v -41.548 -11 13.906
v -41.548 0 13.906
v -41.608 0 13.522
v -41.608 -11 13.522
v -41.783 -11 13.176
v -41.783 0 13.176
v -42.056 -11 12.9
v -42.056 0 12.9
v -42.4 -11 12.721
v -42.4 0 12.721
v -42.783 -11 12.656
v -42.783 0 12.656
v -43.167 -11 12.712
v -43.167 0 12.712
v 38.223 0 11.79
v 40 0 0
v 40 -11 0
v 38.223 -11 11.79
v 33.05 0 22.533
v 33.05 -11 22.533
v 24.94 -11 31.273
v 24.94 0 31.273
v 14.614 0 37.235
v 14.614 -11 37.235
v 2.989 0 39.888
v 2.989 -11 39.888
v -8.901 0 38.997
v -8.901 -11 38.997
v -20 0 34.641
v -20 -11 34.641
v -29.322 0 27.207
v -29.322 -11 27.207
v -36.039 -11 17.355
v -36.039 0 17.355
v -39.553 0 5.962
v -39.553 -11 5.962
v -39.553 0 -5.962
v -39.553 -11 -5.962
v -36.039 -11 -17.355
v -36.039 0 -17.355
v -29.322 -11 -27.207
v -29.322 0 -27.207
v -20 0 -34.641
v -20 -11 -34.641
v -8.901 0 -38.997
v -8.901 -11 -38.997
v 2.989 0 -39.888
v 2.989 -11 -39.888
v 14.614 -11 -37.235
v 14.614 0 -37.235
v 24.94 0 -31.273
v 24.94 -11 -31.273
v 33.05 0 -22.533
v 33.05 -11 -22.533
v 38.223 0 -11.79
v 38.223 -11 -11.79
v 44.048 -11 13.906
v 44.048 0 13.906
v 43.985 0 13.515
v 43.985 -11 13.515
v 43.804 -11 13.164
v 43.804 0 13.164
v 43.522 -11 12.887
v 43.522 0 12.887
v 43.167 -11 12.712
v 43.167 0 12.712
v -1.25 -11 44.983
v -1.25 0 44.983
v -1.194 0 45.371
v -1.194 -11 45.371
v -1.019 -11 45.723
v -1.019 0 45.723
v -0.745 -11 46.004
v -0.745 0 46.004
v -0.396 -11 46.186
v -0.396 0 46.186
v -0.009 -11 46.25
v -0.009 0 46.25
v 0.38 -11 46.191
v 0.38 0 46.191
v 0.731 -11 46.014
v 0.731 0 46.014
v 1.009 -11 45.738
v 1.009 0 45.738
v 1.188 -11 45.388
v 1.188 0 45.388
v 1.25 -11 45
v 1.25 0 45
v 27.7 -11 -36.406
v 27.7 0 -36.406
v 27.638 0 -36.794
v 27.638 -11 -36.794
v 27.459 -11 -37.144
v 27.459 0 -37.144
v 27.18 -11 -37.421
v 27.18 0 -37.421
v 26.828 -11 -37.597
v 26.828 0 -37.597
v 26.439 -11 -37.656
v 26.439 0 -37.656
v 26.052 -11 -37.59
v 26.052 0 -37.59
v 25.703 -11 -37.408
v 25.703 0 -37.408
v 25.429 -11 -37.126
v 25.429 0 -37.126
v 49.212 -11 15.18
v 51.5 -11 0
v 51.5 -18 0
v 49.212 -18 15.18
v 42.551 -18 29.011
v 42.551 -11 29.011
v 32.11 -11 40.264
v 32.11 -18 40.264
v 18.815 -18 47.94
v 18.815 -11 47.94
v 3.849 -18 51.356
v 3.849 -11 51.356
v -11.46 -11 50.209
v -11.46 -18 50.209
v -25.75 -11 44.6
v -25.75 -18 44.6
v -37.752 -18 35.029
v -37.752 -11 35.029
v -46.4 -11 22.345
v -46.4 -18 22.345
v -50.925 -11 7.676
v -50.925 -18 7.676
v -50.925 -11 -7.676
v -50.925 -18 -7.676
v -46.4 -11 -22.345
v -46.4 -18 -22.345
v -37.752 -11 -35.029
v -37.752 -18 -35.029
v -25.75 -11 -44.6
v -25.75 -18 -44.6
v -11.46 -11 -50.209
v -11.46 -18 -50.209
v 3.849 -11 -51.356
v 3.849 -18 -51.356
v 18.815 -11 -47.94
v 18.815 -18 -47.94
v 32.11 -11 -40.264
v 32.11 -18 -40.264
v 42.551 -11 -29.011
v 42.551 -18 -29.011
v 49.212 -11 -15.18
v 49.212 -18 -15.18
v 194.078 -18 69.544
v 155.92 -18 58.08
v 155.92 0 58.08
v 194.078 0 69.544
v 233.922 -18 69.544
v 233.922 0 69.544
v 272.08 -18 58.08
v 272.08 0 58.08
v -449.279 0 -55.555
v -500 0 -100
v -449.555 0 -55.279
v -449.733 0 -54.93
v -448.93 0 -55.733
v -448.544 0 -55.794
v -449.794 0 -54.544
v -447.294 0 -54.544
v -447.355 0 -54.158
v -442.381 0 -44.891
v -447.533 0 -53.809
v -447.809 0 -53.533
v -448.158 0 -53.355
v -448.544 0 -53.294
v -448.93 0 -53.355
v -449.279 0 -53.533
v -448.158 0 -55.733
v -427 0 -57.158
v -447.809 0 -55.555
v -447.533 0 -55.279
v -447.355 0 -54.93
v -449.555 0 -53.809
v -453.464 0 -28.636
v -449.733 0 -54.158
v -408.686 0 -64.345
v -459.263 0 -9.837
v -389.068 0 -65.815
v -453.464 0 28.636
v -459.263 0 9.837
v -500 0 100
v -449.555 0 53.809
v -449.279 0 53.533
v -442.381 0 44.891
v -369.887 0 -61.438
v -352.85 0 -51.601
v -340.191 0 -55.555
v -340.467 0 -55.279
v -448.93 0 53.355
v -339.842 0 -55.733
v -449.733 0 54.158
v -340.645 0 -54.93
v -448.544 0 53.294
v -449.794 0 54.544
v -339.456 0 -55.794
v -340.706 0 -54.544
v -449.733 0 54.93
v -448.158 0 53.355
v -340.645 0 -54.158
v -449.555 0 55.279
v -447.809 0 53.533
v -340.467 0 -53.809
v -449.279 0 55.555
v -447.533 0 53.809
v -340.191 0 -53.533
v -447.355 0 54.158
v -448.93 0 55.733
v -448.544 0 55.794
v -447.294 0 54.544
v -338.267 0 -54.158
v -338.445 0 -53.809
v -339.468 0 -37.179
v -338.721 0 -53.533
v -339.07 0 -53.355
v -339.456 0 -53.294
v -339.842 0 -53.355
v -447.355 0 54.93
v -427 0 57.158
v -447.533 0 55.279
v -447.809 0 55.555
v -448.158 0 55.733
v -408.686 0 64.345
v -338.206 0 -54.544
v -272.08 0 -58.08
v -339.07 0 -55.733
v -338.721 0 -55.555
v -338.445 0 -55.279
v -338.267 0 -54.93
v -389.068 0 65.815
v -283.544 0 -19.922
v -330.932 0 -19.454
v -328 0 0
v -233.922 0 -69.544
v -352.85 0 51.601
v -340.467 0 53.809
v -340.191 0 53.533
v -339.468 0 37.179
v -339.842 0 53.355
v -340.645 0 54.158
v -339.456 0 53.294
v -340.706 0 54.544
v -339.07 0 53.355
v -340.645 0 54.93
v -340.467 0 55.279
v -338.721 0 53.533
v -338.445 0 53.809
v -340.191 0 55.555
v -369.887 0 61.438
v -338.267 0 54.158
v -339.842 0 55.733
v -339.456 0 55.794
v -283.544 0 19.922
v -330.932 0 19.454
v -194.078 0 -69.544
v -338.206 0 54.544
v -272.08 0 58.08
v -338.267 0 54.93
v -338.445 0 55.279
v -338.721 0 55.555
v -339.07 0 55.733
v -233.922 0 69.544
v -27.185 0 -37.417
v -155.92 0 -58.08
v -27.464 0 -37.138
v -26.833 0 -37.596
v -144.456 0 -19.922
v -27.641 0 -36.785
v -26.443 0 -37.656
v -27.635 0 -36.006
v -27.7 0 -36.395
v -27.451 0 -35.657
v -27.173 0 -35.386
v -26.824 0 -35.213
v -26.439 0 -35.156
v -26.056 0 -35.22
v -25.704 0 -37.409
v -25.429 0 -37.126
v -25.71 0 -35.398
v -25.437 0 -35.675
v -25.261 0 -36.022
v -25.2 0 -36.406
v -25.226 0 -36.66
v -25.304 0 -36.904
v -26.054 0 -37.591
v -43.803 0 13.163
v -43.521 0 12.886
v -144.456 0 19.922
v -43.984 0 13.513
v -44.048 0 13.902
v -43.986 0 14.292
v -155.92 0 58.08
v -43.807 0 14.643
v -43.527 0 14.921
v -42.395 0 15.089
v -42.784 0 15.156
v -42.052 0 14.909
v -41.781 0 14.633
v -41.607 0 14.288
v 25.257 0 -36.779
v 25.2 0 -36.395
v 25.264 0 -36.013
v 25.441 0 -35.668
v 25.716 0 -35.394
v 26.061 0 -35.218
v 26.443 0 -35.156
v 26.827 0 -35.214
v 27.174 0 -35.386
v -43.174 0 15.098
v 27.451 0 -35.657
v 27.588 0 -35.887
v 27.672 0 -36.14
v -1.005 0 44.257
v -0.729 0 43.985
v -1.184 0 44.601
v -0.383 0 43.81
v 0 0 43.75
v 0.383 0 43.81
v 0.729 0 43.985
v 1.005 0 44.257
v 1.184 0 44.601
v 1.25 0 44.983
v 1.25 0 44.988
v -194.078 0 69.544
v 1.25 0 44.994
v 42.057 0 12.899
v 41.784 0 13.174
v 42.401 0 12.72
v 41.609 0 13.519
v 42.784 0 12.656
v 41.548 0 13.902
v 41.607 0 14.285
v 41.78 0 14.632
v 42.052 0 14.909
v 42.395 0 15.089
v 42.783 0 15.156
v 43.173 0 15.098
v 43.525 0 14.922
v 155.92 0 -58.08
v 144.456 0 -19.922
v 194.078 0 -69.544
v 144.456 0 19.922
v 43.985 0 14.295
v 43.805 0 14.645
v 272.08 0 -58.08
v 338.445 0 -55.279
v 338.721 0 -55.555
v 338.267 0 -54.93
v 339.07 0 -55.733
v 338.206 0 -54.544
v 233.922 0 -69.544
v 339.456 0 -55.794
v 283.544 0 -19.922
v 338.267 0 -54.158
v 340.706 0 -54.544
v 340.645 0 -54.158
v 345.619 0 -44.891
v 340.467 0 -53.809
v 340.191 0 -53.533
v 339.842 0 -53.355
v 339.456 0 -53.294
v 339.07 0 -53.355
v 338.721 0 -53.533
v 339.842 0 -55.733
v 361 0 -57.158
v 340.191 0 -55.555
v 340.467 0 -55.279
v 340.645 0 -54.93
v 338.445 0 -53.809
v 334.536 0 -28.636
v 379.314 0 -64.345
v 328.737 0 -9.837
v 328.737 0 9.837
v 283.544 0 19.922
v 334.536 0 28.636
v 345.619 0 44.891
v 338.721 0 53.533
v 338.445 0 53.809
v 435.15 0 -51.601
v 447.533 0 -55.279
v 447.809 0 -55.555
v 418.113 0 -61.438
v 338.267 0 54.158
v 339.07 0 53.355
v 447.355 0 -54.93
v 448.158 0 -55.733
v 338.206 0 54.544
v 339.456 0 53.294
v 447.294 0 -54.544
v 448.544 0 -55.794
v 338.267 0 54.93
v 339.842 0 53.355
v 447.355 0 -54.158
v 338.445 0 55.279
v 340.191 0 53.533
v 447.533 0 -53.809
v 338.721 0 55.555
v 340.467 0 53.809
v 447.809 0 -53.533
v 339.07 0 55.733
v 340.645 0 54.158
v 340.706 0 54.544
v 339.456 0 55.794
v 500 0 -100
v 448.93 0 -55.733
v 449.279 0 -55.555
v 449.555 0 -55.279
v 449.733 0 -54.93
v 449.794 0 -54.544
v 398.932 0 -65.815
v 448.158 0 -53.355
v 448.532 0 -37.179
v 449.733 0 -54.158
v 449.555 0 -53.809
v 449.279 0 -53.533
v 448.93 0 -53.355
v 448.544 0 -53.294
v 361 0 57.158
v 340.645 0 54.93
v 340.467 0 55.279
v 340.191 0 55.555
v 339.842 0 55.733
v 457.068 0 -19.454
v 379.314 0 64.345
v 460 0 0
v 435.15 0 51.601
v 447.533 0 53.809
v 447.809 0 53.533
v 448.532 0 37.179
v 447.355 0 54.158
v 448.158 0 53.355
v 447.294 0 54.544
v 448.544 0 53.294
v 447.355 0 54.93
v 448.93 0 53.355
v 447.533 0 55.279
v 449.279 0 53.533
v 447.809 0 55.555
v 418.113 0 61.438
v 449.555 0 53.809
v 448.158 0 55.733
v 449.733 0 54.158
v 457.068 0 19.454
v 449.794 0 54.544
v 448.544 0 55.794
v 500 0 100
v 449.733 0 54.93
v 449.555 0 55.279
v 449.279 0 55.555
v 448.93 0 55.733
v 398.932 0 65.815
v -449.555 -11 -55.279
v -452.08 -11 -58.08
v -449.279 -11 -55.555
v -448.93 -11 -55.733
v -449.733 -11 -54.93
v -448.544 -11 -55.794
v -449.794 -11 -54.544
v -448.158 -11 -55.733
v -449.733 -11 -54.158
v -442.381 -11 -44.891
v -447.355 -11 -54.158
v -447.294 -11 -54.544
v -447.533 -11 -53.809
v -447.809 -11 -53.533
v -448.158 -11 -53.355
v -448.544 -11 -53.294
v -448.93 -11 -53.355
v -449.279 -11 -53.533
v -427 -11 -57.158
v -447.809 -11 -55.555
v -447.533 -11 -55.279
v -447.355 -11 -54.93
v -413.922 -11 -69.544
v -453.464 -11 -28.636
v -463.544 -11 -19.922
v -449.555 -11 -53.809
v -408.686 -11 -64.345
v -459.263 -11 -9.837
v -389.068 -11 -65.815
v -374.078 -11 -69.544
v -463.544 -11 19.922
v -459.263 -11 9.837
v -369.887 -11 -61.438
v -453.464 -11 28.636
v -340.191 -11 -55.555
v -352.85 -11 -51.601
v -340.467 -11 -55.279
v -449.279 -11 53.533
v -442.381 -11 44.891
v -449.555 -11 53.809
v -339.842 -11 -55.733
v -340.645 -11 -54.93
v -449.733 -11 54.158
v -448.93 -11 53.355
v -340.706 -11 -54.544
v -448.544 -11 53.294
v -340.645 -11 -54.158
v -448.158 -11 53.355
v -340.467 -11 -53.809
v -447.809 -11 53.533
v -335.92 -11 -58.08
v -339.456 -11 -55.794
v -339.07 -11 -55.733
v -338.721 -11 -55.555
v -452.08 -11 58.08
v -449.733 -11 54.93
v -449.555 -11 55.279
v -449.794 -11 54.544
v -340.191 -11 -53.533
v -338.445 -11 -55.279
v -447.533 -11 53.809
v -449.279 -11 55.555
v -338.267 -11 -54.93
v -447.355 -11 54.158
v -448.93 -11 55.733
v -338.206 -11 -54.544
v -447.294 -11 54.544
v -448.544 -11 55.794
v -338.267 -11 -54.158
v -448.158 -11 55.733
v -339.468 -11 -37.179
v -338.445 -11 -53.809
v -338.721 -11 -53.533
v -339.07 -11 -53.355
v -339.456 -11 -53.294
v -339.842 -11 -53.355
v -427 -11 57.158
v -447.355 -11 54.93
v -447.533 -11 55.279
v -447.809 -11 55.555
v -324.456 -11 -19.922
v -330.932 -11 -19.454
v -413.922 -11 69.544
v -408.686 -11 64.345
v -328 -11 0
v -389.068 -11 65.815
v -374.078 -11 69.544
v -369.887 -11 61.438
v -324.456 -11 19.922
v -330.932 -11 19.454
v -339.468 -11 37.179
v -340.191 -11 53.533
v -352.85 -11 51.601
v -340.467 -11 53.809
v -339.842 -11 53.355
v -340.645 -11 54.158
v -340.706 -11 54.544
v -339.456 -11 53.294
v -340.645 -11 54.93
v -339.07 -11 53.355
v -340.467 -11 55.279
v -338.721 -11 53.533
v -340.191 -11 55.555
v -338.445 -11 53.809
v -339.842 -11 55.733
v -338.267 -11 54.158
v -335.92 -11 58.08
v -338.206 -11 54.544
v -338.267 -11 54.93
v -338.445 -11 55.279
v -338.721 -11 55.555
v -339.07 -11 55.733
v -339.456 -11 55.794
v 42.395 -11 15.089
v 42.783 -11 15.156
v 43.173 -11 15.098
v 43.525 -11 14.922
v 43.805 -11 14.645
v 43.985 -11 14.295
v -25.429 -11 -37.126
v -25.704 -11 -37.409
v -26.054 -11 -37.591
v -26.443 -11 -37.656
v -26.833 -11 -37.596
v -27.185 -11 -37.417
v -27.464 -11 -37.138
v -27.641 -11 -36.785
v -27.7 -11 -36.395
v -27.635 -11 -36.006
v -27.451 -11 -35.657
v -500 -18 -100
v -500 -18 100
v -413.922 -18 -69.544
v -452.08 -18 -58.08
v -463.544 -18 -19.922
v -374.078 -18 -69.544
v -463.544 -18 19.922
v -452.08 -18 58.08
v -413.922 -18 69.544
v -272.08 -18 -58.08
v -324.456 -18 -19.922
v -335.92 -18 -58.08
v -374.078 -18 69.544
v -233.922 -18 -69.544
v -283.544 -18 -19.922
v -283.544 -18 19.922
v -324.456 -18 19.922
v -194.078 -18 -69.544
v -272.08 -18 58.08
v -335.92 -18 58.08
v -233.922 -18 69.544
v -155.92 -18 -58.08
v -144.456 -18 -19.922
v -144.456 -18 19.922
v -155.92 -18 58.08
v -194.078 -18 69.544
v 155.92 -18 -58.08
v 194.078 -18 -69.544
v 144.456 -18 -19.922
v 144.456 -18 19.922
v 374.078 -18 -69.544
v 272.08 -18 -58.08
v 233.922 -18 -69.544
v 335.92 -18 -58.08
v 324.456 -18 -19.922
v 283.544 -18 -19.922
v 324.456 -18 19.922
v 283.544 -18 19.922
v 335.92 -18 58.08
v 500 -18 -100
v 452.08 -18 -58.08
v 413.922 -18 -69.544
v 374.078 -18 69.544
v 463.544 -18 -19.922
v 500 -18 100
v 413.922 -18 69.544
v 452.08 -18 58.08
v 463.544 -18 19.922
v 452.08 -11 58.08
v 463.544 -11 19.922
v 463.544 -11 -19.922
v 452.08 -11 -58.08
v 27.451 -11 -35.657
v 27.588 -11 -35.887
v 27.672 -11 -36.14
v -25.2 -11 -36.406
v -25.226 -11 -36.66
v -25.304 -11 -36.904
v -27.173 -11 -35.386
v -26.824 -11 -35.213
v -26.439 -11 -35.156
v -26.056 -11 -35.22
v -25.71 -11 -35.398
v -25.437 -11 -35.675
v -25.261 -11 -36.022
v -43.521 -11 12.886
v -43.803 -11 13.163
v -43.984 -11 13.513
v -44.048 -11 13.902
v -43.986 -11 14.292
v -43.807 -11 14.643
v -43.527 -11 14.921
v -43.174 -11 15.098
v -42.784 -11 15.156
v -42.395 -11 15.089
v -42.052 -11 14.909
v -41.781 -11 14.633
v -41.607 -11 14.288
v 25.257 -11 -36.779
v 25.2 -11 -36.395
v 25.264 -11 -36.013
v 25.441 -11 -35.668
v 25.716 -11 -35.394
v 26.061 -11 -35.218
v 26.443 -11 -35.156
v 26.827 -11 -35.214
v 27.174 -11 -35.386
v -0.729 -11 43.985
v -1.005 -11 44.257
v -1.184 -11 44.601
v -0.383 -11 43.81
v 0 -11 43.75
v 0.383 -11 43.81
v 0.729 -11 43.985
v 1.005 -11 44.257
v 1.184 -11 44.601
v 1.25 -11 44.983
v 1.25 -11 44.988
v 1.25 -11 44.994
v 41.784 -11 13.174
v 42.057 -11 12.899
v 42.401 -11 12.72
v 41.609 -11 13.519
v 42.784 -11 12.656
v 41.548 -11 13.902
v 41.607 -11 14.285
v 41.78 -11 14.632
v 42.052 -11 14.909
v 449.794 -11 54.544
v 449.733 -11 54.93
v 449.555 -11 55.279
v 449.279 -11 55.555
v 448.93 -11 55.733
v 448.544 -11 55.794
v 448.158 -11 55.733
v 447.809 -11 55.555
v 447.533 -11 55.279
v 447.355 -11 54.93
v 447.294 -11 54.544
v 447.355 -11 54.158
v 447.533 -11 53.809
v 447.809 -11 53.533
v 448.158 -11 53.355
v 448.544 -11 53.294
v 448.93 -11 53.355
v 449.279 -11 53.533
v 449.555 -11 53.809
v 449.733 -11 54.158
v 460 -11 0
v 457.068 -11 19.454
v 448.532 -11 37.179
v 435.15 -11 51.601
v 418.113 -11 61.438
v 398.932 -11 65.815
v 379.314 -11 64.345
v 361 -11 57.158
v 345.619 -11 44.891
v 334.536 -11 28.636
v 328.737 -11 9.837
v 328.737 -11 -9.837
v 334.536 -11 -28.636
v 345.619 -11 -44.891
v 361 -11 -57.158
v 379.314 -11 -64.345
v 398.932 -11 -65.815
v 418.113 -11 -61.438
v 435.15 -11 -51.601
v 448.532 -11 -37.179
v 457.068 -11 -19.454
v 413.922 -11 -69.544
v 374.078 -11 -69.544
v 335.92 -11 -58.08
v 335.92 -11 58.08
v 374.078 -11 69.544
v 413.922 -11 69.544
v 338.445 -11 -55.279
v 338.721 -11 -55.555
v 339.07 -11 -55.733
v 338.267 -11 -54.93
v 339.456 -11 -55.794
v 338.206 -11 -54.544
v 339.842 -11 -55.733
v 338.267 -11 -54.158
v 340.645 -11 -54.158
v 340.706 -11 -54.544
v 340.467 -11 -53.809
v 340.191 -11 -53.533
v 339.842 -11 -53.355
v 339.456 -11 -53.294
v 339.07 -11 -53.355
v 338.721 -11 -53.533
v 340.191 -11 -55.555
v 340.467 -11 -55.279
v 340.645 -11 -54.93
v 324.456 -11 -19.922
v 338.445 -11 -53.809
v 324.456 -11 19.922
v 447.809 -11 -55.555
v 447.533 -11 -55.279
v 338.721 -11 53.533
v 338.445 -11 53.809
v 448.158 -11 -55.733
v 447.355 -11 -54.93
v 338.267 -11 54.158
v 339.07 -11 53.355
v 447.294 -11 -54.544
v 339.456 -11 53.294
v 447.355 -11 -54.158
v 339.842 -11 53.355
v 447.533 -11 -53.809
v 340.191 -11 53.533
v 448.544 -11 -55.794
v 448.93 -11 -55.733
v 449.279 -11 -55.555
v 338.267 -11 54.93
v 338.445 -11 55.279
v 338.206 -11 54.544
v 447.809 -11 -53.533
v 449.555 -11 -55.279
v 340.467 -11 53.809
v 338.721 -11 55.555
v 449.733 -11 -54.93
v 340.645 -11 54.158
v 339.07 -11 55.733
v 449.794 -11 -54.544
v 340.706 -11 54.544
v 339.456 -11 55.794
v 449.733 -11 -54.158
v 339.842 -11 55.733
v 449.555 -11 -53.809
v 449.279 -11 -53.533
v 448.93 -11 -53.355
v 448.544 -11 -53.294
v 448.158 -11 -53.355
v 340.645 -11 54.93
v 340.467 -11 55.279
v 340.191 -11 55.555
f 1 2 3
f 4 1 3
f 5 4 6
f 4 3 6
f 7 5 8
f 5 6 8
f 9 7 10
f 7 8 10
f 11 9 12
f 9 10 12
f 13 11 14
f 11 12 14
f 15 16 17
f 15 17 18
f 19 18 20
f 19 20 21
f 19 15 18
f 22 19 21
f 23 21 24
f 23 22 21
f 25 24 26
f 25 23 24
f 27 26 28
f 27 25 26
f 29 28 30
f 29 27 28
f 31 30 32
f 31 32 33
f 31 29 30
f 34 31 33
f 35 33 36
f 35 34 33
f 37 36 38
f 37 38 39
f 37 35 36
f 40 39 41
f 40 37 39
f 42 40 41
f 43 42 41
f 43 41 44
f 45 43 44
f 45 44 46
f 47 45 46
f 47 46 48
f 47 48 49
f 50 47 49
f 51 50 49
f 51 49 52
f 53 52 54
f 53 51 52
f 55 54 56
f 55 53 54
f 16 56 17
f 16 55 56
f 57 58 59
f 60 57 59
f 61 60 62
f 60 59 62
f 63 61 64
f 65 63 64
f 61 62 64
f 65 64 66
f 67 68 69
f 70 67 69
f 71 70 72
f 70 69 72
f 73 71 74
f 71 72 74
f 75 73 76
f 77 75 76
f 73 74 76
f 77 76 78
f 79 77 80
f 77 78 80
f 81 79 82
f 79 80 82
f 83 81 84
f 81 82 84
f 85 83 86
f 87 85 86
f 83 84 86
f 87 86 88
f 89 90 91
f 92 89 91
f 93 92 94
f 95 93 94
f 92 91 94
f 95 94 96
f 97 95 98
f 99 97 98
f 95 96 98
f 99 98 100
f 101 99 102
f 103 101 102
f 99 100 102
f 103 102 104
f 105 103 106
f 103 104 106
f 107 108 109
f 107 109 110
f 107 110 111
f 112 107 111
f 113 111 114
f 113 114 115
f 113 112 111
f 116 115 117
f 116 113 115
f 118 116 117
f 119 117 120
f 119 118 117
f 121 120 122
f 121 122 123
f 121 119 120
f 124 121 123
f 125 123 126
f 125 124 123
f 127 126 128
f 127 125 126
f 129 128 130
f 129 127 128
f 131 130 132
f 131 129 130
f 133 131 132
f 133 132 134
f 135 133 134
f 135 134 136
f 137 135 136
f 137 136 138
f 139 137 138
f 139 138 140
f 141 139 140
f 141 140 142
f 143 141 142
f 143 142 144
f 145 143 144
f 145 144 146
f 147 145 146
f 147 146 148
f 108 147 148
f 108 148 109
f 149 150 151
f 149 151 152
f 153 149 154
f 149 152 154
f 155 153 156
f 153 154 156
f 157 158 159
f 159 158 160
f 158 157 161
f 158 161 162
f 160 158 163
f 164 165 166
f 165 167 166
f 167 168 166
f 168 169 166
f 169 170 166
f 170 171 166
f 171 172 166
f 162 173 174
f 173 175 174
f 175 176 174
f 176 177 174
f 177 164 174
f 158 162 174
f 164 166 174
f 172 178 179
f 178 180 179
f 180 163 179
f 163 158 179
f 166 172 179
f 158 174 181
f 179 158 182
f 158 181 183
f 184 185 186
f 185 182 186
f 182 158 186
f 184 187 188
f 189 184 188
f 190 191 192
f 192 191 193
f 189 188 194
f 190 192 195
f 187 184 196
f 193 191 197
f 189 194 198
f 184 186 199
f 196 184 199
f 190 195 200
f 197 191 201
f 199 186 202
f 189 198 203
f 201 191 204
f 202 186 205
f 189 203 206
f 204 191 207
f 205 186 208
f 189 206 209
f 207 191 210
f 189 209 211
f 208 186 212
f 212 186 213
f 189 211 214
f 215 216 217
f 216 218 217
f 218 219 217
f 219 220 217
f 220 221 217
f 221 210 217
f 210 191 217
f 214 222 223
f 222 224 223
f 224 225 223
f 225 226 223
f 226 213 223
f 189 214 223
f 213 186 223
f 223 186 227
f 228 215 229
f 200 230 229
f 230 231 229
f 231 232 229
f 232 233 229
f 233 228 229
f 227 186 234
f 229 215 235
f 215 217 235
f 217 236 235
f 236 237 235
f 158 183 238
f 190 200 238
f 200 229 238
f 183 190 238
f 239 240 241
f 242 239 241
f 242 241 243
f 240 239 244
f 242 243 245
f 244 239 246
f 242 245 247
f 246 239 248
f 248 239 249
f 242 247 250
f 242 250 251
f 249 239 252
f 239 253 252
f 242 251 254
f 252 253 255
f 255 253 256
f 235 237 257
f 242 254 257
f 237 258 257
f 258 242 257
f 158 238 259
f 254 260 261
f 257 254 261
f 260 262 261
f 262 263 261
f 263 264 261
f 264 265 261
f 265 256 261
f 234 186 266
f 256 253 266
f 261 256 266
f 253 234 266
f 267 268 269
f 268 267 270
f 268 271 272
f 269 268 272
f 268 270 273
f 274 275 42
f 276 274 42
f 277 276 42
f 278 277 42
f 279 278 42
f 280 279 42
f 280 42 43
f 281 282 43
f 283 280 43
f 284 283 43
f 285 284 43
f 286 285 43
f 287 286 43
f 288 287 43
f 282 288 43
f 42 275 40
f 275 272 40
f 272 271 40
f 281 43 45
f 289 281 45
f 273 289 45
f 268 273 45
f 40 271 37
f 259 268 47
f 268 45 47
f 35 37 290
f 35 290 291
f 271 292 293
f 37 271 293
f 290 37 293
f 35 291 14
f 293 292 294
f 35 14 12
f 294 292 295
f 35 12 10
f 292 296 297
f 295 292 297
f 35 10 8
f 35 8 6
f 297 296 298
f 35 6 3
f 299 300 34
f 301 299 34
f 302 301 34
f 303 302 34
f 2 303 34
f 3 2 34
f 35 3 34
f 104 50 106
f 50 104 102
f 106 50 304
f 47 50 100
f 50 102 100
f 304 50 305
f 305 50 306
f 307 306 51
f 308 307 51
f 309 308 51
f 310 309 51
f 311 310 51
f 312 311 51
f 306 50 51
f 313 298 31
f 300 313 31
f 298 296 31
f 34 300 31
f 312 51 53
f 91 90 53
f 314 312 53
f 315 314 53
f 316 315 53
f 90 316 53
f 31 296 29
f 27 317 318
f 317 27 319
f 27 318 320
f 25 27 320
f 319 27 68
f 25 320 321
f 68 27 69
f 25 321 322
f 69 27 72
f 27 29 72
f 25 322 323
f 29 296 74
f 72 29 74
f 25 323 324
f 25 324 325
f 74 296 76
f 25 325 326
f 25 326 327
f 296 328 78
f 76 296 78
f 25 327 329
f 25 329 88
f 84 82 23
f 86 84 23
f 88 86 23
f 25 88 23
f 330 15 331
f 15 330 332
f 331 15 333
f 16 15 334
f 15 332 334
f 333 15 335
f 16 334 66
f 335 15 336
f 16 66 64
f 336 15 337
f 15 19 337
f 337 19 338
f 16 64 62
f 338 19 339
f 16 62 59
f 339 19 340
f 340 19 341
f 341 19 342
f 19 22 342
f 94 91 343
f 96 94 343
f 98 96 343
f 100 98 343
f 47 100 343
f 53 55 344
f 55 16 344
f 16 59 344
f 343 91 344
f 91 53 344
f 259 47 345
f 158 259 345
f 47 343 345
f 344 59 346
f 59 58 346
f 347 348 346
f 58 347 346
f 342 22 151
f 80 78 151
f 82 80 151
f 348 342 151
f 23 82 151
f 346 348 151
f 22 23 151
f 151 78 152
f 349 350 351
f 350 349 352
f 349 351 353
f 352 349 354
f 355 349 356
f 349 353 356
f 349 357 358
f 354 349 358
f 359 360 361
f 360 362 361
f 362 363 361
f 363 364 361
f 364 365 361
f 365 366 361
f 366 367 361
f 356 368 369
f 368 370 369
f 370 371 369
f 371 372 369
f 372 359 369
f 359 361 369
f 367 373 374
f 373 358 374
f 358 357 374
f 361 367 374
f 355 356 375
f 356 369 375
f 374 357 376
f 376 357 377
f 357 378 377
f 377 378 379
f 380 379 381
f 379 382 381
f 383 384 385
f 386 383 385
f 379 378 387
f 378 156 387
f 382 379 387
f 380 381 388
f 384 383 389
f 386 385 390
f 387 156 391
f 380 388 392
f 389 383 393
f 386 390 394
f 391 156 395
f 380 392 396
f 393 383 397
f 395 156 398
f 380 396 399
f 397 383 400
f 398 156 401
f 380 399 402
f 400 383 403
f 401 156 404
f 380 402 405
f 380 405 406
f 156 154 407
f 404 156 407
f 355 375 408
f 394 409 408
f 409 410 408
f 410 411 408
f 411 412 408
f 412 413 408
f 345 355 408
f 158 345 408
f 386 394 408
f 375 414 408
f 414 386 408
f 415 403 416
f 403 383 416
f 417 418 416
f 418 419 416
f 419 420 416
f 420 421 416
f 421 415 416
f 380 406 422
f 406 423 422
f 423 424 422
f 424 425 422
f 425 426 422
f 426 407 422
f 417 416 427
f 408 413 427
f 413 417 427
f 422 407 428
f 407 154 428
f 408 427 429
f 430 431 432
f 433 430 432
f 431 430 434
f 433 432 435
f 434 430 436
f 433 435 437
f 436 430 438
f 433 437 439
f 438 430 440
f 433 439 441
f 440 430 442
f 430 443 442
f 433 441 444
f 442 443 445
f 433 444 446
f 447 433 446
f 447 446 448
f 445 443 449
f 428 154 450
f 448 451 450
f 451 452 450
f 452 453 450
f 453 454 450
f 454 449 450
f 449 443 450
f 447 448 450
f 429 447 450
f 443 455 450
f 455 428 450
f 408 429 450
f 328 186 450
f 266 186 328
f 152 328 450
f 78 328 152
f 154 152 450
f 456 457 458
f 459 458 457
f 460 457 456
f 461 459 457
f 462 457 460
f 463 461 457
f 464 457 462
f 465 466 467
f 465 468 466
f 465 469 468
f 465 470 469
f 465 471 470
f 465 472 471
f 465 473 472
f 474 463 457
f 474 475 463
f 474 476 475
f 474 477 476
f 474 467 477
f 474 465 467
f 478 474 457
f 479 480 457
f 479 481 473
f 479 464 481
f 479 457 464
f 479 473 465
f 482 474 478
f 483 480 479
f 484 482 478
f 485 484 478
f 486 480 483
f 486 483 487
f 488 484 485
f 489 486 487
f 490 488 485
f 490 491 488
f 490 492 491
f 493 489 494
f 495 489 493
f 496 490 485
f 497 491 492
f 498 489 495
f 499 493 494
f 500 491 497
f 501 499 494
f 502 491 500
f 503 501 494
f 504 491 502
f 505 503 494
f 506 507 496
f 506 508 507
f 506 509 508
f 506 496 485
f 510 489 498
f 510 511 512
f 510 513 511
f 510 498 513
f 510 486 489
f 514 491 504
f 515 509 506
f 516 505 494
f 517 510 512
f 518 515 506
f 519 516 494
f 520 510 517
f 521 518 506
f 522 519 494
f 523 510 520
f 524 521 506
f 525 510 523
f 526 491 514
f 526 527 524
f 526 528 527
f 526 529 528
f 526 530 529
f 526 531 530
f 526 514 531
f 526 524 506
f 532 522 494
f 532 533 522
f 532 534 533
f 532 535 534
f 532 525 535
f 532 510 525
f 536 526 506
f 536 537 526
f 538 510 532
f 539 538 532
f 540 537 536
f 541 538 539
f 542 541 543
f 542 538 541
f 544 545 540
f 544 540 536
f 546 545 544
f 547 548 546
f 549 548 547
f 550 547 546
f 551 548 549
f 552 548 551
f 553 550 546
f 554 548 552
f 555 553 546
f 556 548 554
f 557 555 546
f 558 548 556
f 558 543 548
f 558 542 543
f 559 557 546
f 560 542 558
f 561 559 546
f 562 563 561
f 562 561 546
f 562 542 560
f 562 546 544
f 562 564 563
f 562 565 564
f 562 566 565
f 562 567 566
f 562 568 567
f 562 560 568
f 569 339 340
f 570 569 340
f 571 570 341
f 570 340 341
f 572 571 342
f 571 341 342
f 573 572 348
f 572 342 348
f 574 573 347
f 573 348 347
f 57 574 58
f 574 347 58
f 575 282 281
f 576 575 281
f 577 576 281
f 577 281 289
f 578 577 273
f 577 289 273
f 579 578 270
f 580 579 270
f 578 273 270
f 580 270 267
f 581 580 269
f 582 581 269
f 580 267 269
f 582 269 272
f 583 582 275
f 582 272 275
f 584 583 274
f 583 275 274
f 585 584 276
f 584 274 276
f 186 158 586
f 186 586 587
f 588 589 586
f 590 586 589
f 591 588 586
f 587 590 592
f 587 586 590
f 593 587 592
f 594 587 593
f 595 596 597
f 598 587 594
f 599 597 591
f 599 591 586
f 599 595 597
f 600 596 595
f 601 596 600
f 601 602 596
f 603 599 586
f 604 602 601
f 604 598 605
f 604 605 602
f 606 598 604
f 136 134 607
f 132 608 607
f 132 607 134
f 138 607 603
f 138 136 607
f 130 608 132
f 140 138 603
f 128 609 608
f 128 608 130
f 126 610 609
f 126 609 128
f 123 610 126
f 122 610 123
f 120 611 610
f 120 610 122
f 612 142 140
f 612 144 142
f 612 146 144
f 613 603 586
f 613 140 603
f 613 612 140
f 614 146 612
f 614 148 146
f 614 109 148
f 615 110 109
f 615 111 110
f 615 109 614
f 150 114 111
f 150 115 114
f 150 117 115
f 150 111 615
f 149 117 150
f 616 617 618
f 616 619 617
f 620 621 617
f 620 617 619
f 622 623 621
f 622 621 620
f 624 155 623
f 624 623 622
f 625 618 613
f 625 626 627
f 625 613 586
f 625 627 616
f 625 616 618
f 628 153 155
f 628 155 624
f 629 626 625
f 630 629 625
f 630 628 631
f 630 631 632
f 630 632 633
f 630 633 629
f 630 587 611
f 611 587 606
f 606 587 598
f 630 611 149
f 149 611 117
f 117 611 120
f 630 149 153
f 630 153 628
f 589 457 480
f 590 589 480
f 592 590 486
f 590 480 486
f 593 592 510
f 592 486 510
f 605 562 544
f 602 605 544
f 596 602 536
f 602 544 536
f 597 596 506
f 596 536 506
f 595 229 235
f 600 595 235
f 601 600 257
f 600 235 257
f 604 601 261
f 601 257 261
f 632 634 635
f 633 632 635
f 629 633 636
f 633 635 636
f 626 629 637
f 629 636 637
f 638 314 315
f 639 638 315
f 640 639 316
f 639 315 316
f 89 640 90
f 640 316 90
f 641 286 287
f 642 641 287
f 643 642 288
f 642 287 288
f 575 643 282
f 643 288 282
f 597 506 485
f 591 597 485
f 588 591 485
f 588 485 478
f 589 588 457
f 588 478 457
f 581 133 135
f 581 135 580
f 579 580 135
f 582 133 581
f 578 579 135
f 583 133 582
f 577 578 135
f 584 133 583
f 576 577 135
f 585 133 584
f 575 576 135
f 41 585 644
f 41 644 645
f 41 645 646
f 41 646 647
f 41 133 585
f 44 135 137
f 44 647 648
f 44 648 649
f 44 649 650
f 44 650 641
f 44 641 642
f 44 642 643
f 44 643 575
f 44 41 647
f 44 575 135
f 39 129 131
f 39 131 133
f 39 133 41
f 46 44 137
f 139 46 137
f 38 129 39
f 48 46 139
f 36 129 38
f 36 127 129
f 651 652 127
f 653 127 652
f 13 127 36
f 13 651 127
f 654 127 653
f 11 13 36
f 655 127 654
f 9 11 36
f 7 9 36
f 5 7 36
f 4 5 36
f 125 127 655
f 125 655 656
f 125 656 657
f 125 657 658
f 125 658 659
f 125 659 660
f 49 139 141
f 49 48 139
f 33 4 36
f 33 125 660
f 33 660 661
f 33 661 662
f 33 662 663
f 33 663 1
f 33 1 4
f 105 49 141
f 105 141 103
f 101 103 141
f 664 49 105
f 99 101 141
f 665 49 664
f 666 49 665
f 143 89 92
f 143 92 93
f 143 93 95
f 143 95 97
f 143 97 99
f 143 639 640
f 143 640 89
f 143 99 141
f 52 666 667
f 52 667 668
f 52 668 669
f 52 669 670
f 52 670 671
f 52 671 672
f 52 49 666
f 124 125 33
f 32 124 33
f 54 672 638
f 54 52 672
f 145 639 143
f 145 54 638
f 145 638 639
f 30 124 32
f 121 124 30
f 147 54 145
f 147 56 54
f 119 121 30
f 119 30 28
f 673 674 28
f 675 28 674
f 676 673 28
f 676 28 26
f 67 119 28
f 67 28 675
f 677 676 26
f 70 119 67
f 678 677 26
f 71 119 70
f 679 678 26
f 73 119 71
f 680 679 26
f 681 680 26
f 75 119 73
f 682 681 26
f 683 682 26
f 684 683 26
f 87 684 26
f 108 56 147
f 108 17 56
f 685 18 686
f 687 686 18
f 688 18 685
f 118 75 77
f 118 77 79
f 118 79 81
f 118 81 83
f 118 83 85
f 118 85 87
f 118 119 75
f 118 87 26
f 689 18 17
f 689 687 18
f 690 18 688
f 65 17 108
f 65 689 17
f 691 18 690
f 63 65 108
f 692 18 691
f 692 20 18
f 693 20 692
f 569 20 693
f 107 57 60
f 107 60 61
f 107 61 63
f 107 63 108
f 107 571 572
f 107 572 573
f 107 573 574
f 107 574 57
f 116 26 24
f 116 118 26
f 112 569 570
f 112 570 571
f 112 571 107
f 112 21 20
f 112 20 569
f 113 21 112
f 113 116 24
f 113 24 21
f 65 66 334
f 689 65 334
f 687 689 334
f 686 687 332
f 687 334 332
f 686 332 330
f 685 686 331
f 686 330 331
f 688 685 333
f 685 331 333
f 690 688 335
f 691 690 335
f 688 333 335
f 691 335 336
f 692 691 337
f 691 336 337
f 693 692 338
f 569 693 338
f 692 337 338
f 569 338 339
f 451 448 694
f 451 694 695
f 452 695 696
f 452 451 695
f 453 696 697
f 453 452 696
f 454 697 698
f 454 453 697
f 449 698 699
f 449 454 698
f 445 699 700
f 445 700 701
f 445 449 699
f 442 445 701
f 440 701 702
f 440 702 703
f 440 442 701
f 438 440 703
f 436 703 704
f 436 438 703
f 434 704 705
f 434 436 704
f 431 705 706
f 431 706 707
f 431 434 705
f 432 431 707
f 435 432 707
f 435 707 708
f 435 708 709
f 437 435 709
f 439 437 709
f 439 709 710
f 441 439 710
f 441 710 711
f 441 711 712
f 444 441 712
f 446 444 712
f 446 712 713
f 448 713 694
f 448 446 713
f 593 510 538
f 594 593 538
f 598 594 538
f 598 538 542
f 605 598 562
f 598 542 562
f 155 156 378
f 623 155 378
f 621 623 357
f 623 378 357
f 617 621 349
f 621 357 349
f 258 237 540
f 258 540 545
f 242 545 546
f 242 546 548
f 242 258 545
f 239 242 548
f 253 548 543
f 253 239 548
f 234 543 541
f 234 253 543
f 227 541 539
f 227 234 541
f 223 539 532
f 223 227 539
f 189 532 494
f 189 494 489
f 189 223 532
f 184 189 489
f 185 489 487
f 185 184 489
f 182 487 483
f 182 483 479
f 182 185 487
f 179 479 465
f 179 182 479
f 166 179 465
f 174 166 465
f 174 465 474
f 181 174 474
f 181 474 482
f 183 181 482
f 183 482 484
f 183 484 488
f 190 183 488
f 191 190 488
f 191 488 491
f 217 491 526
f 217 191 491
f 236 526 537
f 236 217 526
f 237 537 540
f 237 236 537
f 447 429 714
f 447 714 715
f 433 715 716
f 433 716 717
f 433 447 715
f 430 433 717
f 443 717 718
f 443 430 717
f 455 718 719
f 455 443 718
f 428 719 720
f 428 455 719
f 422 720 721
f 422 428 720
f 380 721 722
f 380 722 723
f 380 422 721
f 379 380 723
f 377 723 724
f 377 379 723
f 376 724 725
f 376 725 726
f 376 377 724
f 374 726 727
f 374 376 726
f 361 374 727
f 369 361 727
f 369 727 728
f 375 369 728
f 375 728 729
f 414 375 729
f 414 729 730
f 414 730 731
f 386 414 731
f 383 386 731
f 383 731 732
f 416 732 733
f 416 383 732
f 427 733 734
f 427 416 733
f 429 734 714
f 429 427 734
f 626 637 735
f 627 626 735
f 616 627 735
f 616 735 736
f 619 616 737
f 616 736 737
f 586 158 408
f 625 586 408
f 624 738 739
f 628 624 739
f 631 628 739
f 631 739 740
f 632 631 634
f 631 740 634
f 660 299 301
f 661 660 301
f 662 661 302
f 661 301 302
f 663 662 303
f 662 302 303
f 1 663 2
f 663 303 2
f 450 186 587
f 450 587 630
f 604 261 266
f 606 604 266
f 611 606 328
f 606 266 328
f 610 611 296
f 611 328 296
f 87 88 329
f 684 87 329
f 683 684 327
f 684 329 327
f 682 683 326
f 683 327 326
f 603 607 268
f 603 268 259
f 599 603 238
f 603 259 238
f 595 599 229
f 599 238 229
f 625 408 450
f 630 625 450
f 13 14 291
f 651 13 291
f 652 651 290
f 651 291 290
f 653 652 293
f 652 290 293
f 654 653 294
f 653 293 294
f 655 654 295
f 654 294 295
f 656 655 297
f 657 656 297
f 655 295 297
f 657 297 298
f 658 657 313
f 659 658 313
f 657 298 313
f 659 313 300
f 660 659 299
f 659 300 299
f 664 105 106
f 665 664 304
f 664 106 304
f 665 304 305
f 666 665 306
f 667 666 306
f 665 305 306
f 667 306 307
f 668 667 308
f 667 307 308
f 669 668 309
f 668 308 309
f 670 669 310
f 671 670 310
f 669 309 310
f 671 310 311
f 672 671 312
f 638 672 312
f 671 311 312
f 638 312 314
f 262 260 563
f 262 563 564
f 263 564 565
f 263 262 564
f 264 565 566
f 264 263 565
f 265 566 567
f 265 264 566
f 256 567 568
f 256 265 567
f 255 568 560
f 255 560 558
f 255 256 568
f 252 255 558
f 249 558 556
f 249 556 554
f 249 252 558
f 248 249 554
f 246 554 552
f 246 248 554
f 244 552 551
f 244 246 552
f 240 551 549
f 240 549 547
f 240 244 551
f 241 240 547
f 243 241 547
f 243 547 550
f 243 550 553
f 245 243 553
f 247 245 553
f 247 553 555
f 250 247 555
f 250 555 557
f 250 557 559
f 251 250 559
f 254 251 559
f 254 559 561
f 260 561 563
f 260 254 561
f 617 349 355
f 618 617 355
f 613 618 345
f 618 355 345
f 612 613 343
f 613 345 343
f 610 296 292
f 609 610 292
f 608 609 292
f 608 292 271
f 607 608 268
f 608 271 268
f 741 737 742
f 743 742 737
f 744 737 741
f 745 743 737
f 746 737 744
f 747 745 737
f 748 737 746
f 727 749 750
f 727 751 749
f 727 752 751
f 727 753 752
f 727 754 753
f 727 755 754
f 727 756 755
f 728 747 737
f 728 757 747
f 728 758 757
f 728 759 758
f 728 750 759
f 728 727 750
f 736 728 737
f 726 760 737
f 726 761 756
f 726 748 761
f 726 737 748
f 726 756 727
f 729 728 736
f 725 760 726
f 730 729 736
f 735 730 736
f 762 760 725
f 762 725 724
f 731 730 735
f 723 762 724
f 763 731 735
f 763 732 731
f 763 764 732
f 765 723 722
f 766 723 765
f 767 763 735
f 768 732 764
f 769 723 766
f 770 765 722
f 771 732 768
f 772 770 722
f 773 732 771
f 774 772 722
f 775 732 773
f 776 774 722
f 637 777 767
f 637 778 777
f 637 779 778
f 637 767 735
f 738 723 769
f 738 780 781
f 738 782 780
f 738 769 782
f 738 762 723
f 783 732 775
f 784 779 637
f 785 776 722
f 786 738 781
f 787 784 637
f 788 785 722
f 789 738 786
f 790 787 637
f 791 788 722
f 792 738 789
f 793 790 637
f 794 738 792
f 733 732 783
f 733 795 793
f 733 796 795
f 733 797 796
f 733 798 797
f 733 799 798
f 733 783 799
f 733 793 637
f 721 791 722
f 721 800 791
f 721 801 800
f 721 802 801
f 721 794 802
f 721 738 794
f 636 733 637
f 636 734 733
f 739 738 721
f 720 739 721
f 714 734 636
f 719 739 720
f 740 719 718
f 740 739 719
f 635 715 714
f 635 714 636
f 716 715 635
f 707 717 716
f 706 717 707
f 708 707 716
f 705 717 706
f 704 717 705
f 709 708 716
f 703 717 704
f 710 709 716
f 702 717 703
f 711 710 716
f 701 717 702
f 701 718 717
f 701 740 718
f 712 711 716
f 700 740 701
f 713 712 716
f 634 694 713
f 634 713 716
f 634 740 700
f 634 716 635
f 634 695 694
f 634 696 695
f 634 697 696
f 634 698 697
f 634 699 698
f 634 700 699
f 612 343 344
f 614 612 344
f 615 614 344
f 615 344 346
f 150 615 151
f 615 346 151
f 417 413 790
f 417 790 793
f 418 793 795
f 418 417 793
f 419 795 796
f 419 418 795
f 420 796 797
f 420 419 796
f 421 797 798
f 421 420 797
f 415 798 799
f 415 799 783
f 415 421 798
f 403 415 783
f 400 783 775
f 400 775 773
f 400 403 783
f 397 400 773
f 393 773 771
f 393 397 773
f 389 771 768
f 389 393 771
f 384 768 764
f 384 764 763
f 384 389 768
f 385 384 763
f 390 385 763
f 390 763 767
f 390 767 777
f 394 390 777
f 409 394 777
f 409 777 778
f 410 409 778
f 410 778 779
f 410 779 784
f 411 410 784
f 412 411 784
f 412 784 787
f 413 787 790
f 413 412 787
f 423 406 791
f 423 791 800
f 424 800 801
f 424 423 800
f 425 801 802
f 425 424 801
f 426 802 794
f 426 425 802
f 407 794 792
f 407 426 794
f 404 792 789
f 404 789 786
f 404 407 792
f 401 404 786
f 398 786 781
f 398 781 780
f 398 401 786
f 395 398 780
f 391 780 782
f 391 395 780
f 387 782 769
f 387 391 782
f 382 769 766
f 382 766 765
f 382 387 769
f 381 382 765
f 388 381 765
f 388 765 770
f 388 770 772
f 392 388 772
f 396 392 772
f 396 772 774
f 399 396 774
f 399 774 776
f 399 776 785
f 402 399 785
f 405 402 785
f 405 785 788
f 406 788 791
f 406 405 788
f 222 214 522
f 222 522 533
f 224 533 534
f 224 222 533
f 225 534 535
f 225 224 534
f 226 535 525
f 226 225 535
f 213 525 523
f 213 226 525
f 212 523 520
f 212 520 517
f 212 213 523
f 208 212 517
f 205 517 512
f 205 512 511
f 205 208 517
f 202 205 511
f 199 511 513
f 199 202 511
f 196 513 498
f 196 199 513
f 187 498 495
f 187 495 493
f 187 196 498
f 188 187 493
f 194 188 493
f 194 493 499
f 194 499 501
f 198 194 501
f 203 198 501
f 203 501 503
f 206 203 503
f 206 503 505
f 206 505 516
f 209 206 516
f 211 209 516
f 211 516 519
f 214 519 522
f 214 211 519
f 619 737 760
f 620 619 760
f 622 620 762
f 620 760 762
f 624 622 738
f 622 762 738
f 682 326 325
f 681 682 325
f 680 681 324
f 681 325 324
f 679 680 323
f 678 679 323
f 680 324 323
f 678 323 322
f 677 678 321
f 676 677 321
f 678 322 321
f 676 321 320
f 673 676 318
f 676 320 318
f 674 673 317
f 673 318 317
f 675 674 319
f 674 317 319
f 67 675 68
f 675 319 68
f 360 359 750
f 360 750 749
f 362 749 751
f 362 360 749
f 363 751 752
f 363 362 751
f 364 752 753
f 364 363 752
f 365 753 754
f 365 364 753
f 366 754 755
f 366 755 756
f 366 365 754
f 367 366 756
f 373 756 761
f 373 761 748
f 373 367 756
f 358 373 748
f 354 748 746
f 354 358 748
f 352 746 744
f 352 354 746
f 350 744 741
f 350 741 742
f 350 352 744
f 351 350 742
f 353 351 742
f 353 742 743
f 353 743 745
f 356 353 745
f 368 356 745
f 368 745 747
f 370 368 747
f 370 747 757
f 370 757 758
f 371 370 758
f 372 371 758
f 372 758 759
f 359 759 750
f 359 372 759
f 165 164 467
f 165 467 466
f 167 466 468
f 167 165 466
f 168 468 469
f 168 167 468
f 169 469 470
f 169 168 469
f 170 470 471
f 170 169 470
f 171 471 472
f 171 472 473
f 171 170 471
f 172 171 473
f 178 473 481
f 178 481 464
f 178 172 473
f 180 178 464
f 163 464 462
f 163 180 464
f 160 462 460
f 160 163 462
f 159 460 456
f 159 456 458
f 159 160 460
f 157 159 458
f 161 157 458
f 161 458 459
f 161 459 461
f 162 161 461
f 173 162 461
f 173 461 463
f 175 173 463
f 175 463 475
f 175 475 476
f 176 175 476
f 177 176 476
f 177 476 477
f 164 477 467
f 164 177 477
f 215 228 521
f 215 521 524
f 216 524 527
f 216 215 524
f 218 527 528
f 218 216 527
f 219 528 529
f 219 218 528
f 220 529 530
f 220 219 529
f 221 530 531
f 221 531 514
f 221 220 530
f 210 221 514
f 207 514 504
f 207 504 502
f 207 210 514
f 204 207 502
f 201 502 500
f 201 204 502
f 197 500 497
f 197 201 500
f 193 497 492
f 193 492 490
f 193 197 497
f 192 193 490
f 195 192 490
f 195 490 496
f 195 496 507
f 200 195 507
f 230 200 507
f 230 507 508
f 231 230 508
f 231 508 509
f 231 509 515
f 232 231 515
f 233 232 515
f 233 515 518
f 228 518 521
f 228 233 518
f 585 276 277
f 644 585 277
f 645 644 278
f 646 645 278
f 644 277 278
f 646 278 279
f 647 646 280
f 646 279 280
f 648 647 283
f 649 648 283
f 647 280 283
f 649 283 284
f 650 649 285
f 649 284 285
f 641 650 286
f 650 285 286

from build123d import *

# Parameters (mm, degrees)
F0_W     = 1000
F0_H     = 200
F0_R     = 51.5
F1_DEPTH = 18
F0_R_2   = 1.25
F0_R_3   = 66
F0_R_4   = 40
F2_DEPTH = 11


# Not quite as in the source:
# - a feature names something its author has since deleted; it is built from what else it names


with BuildPart() as f1:
    # F0 (on Front) → F1 (new body)
    with BuildSketch(Plane.XZ):
        Rectangle(F0_W, F0_H)
        with BuildLine():
            ThreePointArc((-452.0796354846, 58.0796354846), (-394, 71), (-335.9203645154, 58.0796354846))
            ThreePointArc((-335.9203645154, 58.0796354846), (-323, 0), (-335.9203645154, -58.0796354846))
            ThreePointArc((-335.9203645154, -58.0796354846), (-394, -71), (-452.0796354846, -58.0796354846))
            ThreePointArc((-452.0796354846, -58.0796354846), (-465, 0), (-452.0796354846, 58.0796354846))
        make_face(mode=Mode.SUBTRACT)
        with BuildLine():
            ThreePointArc((-272.0796354846, 58.0796354846), (-214, 71), (-155.9203645154, 58.0796354846))
            ThreePointArc((-155.9203645154, 58.0796354846), (-143, 0), (-155.9203645154, -58.0796354846))
            ThreePointArc((-155.9203645154, -58.0796354846), (-214, -71), (-272.0796354846, -58.0796354846))
            ThreePointArc((-272.0796354846, -58.0796354846), (-285, 0), (-272.0796354846, 58.0796354846))
        make_face(mode=Mode.SUBTRACT)
        Circle(F0_R, mode=Mode.SUBTRACT)
        with BuildLine():
            ThreePointArc((155.9203645154, -58.0796354846), (143, 0), (155.9203645154, 58.0796354846))
            ThreePointArc((155.9203645154, 58.0796354846), (214, 71), (272.0796354846, 58.0796354846))
            ThreePointArc((272.0796354846, 58.0796354846), (285, 0), (272.0796354846, -58.0796354846))
            ThreePointArc((272.0796354846, -58.0796354846), (214, -71), (155.9203645154, -58.0796354846))
        make_face(mode=Mode.SUBTRACT)
        with BuildLine():
            ThreePointArc((335.9203645154, 58.0796354846), (394, 71), (452.0796354846, 58.0796354846))
            ThreePointArc((452.0796354846, 58.0796354846), (465, 0), (452.0796354846, -58.0796354846))
            ThreePointArc((452.0796354846, -58.0796354846), (394, -71), (335.9203645154, -58.0796354846))
            ThreePointArc((335.9203645154, -58.0796354846), (323, 0), (335.9203645154, 58.0796354846))
        make_face(mode=Mode.SUBTRACT)
    extrude(amount=F1_DEPTH)

    # F0 (on Front) → F2 (join)
    with BuildSketch(Plane.XZ):
        with BuildLine():
            ThreePointArc((-335.9203645154, -58.0796354846), (-323, 0), (-335.9203645154, 58.0796354846))
            ThreePointArc((-335.9203645154, 58.0796354846), (-394, 71), (-452.0796354846, 58.0796354846))
            ThreePointArc((-452.0796354846, 58.0796354846), (-465, 0), (-452.0796354846, -58.0796354846))
            ThreePointArc((-452.0796354846, -58.0796354846), (-394, -71), (-335.9203645154, -58.0796354846))
        make_face()
        with Locations((-448.5441015786, -54.5441015786)):
            Circle(F0_R_2, mode=Mode.SUBTRACT)
        with Locations((-339.4558984214, -54.5441015786)):
            Circle(F0_R_2, mode=Mode.SUBTRACT)
        with Locations((-394, 0)):
            Circle(F0_R_3, mode=Mode.SUBTRACT)
        with Locations((-448.5441015786, 54.5441015786)):
            Circle(F0_R_2, mode=Mode.SUBTRACT)
        with Locations((-339.4558984214, 54.5441015786)):
            Circle(F0_R_2, mode=Mode.SUBTRACT)
        with BuildLine():
            ThreePointArc((452.0796354846, -58.0796354846), (465, 0), (452.0796354846, 58.0796354846))
            ThreePointArc((452.0796354846, 58.0796354846), (394, 71), (335.9203645154, 58.0796354846))
            ThreePointArc((335.9203645154, 58.0796354846), (323, 0), (335.9203645154, -58.0796354846))
            ThreePointArc((335.9203645154, -58.0796354846), (394, -71), (452.0796354846, -58.0796354846))
        make_face()
        with Locations((339.4558984214, -54.5441015786)):
            Circle(F0_R_2, mode=Mode.SUBTRACT)
        with Locations((448.5441015786, -54.5441015786)):
            Circle(F0_R_2, mode=Mode.SUBTRACT)
        with Locations((394, 0)):
            Circle(F0_R_3, mode=Mode.SUBTRACT)
        with Locations((339.4558984214, 54.5441015786)):
            Circle(F0_R_2, mode=Mode.SUBTRACT)
        with Locations((448.5441015786, 54.5441015786)):
            Circle(F0_R_2, mode=Mode.SUBTRACT)
        Circle(F0_R)
        with BuildLine():
            ThreePointArc((43.1672658205, 12.7116938911), (44.5394598189, 6.4215667122), (45, 0))
            ThreePointArc((45, 0), (40.3751702485, -19.8707228708), (27.4513054486, -35.6570586163))
            ThreePointArc((27.4513054486, -35.6570586163), (27.6364458273, -36.0112469205), (27.7003363532, -36.4057647469))
            ThreePointArc((27.7003363532, -36.4057647469), (26.8283423835, -37.5972392288), (25.4289580476, -37.1263800096))
            ThreePointArc((25.4289580476, -37.1263800096), (0, -45), (-25.4289580476, -37.1263800096))
            ThreePointArc((-25.4289580476, -37.1263800096), (-27.1850679185, -37.4170359898), (-27.4513054486, -35.6570586163))
            ThreePointArc((-27.4513054486, -35.6570586163), (-42.7975432333, -13.9057647469), (-43.1672658205, 12.7116938911))
            ThreePointArc((-43.1672658205, 12.7116938911), (-43.9863638787, 14.2920359898), (-42.3947978504, 15.0891058459))
            ThreePointArc((-42.3947978504, 15.0891058459), (-26.4503363532, 36.4057647469), (-1.2498794309, 44.9826388889))
            ThreePointArc((-1.2498794309, 44.9826388889), (-0.0086807649, 46.2499698574), (1.25, 45))
            ThreePointArc((1.25, 45), (1.2499698574, 44.9913192351), (1.2498794309, 44.9826388889))
            ThreePointArc((1.2498794309, 44.9826388889), (26.4503363532, 36.4057647469), (42.3947978504, 15.0891058459))
            ThreePointArc((42.3947978504, 15.0891058459), (43.5252341949, 14.9221140295), (44.0475432333, 13.9057647469))
            ThreePointArc((44.0475432333, 13.9057647469), (43.8036876648, 13.1640280126), (43.1672658205, 12.7116938911))
        make_face(mode=Mode.SUBTRACT)
        with BuildLine():
            ThreePointArc((27.4513054486, -35.6570586163), (40.3751702485, -19.8707228708), (45, 0))
            ThreePointArc((45, 0), (44.5394598189, 6.4215667122), (43.1672658205, 12.7116938911))
            ThreePointArc((43.1672658205, 12.7116938911), (41.6087225879, 13.5194935039), (42.3947978504, 15.0891058459))
            ThreePointArc((42.3947978504, 15.0891058459), (26.4503363532, 36.4057647469), (1.2498794309, 44.9826388889))
            ThreePointArc((1.2498794309, 44.9826388889), (0, 43.75), (-1.2498794309, 44.9826388889))
            ThreePointArc((-1.2498794309, 44.9826388889), (-26.4503363532, 36.4057647469), (-42.3947978504, 15.0891058459))
            ThreePointArc((-42.3947978504, 15.0891058459), (-41.7811939506, 14.6334557085), (-41.5475432333, 13.9057647469))
            ThreePointArc((-41.5475432333, 13.9057647469), (-42.055806499, 12.8996203154), (-43.1672658205, 12.7116938911))
            ThreePointArc((-43.1672658205, 12.7116938911), (-42.7975432333, -13.9057647469), (-27.4513054486, -35.6570586163))
            ThreePointArc((-27.4513054486, -35.6570586163), (-26.0558185268, -35.2196552727), (-25.2003363532, -36.4057647469))
            ThreePointArc((-25.2003363532, -36.4057647469), (-25.2588618713, -36.7837707772), (-25.4289580476, -37.1263800096))
            ThreePointArc((-25.4289580476, -37.1263800096), (0, -45), (25.4289580476, -37.1263800096))
            ThreePointArc((25.4289580476, -37.1263800096), (25.7156047878, -35.3944935039), (27.4513054486, -35.6570586163))
        make_face()
        Circle(F0_R_4, mode=Mode.SUBTRACT)
    extrude(amount=F2_DEPTH)


solid = f1.part
